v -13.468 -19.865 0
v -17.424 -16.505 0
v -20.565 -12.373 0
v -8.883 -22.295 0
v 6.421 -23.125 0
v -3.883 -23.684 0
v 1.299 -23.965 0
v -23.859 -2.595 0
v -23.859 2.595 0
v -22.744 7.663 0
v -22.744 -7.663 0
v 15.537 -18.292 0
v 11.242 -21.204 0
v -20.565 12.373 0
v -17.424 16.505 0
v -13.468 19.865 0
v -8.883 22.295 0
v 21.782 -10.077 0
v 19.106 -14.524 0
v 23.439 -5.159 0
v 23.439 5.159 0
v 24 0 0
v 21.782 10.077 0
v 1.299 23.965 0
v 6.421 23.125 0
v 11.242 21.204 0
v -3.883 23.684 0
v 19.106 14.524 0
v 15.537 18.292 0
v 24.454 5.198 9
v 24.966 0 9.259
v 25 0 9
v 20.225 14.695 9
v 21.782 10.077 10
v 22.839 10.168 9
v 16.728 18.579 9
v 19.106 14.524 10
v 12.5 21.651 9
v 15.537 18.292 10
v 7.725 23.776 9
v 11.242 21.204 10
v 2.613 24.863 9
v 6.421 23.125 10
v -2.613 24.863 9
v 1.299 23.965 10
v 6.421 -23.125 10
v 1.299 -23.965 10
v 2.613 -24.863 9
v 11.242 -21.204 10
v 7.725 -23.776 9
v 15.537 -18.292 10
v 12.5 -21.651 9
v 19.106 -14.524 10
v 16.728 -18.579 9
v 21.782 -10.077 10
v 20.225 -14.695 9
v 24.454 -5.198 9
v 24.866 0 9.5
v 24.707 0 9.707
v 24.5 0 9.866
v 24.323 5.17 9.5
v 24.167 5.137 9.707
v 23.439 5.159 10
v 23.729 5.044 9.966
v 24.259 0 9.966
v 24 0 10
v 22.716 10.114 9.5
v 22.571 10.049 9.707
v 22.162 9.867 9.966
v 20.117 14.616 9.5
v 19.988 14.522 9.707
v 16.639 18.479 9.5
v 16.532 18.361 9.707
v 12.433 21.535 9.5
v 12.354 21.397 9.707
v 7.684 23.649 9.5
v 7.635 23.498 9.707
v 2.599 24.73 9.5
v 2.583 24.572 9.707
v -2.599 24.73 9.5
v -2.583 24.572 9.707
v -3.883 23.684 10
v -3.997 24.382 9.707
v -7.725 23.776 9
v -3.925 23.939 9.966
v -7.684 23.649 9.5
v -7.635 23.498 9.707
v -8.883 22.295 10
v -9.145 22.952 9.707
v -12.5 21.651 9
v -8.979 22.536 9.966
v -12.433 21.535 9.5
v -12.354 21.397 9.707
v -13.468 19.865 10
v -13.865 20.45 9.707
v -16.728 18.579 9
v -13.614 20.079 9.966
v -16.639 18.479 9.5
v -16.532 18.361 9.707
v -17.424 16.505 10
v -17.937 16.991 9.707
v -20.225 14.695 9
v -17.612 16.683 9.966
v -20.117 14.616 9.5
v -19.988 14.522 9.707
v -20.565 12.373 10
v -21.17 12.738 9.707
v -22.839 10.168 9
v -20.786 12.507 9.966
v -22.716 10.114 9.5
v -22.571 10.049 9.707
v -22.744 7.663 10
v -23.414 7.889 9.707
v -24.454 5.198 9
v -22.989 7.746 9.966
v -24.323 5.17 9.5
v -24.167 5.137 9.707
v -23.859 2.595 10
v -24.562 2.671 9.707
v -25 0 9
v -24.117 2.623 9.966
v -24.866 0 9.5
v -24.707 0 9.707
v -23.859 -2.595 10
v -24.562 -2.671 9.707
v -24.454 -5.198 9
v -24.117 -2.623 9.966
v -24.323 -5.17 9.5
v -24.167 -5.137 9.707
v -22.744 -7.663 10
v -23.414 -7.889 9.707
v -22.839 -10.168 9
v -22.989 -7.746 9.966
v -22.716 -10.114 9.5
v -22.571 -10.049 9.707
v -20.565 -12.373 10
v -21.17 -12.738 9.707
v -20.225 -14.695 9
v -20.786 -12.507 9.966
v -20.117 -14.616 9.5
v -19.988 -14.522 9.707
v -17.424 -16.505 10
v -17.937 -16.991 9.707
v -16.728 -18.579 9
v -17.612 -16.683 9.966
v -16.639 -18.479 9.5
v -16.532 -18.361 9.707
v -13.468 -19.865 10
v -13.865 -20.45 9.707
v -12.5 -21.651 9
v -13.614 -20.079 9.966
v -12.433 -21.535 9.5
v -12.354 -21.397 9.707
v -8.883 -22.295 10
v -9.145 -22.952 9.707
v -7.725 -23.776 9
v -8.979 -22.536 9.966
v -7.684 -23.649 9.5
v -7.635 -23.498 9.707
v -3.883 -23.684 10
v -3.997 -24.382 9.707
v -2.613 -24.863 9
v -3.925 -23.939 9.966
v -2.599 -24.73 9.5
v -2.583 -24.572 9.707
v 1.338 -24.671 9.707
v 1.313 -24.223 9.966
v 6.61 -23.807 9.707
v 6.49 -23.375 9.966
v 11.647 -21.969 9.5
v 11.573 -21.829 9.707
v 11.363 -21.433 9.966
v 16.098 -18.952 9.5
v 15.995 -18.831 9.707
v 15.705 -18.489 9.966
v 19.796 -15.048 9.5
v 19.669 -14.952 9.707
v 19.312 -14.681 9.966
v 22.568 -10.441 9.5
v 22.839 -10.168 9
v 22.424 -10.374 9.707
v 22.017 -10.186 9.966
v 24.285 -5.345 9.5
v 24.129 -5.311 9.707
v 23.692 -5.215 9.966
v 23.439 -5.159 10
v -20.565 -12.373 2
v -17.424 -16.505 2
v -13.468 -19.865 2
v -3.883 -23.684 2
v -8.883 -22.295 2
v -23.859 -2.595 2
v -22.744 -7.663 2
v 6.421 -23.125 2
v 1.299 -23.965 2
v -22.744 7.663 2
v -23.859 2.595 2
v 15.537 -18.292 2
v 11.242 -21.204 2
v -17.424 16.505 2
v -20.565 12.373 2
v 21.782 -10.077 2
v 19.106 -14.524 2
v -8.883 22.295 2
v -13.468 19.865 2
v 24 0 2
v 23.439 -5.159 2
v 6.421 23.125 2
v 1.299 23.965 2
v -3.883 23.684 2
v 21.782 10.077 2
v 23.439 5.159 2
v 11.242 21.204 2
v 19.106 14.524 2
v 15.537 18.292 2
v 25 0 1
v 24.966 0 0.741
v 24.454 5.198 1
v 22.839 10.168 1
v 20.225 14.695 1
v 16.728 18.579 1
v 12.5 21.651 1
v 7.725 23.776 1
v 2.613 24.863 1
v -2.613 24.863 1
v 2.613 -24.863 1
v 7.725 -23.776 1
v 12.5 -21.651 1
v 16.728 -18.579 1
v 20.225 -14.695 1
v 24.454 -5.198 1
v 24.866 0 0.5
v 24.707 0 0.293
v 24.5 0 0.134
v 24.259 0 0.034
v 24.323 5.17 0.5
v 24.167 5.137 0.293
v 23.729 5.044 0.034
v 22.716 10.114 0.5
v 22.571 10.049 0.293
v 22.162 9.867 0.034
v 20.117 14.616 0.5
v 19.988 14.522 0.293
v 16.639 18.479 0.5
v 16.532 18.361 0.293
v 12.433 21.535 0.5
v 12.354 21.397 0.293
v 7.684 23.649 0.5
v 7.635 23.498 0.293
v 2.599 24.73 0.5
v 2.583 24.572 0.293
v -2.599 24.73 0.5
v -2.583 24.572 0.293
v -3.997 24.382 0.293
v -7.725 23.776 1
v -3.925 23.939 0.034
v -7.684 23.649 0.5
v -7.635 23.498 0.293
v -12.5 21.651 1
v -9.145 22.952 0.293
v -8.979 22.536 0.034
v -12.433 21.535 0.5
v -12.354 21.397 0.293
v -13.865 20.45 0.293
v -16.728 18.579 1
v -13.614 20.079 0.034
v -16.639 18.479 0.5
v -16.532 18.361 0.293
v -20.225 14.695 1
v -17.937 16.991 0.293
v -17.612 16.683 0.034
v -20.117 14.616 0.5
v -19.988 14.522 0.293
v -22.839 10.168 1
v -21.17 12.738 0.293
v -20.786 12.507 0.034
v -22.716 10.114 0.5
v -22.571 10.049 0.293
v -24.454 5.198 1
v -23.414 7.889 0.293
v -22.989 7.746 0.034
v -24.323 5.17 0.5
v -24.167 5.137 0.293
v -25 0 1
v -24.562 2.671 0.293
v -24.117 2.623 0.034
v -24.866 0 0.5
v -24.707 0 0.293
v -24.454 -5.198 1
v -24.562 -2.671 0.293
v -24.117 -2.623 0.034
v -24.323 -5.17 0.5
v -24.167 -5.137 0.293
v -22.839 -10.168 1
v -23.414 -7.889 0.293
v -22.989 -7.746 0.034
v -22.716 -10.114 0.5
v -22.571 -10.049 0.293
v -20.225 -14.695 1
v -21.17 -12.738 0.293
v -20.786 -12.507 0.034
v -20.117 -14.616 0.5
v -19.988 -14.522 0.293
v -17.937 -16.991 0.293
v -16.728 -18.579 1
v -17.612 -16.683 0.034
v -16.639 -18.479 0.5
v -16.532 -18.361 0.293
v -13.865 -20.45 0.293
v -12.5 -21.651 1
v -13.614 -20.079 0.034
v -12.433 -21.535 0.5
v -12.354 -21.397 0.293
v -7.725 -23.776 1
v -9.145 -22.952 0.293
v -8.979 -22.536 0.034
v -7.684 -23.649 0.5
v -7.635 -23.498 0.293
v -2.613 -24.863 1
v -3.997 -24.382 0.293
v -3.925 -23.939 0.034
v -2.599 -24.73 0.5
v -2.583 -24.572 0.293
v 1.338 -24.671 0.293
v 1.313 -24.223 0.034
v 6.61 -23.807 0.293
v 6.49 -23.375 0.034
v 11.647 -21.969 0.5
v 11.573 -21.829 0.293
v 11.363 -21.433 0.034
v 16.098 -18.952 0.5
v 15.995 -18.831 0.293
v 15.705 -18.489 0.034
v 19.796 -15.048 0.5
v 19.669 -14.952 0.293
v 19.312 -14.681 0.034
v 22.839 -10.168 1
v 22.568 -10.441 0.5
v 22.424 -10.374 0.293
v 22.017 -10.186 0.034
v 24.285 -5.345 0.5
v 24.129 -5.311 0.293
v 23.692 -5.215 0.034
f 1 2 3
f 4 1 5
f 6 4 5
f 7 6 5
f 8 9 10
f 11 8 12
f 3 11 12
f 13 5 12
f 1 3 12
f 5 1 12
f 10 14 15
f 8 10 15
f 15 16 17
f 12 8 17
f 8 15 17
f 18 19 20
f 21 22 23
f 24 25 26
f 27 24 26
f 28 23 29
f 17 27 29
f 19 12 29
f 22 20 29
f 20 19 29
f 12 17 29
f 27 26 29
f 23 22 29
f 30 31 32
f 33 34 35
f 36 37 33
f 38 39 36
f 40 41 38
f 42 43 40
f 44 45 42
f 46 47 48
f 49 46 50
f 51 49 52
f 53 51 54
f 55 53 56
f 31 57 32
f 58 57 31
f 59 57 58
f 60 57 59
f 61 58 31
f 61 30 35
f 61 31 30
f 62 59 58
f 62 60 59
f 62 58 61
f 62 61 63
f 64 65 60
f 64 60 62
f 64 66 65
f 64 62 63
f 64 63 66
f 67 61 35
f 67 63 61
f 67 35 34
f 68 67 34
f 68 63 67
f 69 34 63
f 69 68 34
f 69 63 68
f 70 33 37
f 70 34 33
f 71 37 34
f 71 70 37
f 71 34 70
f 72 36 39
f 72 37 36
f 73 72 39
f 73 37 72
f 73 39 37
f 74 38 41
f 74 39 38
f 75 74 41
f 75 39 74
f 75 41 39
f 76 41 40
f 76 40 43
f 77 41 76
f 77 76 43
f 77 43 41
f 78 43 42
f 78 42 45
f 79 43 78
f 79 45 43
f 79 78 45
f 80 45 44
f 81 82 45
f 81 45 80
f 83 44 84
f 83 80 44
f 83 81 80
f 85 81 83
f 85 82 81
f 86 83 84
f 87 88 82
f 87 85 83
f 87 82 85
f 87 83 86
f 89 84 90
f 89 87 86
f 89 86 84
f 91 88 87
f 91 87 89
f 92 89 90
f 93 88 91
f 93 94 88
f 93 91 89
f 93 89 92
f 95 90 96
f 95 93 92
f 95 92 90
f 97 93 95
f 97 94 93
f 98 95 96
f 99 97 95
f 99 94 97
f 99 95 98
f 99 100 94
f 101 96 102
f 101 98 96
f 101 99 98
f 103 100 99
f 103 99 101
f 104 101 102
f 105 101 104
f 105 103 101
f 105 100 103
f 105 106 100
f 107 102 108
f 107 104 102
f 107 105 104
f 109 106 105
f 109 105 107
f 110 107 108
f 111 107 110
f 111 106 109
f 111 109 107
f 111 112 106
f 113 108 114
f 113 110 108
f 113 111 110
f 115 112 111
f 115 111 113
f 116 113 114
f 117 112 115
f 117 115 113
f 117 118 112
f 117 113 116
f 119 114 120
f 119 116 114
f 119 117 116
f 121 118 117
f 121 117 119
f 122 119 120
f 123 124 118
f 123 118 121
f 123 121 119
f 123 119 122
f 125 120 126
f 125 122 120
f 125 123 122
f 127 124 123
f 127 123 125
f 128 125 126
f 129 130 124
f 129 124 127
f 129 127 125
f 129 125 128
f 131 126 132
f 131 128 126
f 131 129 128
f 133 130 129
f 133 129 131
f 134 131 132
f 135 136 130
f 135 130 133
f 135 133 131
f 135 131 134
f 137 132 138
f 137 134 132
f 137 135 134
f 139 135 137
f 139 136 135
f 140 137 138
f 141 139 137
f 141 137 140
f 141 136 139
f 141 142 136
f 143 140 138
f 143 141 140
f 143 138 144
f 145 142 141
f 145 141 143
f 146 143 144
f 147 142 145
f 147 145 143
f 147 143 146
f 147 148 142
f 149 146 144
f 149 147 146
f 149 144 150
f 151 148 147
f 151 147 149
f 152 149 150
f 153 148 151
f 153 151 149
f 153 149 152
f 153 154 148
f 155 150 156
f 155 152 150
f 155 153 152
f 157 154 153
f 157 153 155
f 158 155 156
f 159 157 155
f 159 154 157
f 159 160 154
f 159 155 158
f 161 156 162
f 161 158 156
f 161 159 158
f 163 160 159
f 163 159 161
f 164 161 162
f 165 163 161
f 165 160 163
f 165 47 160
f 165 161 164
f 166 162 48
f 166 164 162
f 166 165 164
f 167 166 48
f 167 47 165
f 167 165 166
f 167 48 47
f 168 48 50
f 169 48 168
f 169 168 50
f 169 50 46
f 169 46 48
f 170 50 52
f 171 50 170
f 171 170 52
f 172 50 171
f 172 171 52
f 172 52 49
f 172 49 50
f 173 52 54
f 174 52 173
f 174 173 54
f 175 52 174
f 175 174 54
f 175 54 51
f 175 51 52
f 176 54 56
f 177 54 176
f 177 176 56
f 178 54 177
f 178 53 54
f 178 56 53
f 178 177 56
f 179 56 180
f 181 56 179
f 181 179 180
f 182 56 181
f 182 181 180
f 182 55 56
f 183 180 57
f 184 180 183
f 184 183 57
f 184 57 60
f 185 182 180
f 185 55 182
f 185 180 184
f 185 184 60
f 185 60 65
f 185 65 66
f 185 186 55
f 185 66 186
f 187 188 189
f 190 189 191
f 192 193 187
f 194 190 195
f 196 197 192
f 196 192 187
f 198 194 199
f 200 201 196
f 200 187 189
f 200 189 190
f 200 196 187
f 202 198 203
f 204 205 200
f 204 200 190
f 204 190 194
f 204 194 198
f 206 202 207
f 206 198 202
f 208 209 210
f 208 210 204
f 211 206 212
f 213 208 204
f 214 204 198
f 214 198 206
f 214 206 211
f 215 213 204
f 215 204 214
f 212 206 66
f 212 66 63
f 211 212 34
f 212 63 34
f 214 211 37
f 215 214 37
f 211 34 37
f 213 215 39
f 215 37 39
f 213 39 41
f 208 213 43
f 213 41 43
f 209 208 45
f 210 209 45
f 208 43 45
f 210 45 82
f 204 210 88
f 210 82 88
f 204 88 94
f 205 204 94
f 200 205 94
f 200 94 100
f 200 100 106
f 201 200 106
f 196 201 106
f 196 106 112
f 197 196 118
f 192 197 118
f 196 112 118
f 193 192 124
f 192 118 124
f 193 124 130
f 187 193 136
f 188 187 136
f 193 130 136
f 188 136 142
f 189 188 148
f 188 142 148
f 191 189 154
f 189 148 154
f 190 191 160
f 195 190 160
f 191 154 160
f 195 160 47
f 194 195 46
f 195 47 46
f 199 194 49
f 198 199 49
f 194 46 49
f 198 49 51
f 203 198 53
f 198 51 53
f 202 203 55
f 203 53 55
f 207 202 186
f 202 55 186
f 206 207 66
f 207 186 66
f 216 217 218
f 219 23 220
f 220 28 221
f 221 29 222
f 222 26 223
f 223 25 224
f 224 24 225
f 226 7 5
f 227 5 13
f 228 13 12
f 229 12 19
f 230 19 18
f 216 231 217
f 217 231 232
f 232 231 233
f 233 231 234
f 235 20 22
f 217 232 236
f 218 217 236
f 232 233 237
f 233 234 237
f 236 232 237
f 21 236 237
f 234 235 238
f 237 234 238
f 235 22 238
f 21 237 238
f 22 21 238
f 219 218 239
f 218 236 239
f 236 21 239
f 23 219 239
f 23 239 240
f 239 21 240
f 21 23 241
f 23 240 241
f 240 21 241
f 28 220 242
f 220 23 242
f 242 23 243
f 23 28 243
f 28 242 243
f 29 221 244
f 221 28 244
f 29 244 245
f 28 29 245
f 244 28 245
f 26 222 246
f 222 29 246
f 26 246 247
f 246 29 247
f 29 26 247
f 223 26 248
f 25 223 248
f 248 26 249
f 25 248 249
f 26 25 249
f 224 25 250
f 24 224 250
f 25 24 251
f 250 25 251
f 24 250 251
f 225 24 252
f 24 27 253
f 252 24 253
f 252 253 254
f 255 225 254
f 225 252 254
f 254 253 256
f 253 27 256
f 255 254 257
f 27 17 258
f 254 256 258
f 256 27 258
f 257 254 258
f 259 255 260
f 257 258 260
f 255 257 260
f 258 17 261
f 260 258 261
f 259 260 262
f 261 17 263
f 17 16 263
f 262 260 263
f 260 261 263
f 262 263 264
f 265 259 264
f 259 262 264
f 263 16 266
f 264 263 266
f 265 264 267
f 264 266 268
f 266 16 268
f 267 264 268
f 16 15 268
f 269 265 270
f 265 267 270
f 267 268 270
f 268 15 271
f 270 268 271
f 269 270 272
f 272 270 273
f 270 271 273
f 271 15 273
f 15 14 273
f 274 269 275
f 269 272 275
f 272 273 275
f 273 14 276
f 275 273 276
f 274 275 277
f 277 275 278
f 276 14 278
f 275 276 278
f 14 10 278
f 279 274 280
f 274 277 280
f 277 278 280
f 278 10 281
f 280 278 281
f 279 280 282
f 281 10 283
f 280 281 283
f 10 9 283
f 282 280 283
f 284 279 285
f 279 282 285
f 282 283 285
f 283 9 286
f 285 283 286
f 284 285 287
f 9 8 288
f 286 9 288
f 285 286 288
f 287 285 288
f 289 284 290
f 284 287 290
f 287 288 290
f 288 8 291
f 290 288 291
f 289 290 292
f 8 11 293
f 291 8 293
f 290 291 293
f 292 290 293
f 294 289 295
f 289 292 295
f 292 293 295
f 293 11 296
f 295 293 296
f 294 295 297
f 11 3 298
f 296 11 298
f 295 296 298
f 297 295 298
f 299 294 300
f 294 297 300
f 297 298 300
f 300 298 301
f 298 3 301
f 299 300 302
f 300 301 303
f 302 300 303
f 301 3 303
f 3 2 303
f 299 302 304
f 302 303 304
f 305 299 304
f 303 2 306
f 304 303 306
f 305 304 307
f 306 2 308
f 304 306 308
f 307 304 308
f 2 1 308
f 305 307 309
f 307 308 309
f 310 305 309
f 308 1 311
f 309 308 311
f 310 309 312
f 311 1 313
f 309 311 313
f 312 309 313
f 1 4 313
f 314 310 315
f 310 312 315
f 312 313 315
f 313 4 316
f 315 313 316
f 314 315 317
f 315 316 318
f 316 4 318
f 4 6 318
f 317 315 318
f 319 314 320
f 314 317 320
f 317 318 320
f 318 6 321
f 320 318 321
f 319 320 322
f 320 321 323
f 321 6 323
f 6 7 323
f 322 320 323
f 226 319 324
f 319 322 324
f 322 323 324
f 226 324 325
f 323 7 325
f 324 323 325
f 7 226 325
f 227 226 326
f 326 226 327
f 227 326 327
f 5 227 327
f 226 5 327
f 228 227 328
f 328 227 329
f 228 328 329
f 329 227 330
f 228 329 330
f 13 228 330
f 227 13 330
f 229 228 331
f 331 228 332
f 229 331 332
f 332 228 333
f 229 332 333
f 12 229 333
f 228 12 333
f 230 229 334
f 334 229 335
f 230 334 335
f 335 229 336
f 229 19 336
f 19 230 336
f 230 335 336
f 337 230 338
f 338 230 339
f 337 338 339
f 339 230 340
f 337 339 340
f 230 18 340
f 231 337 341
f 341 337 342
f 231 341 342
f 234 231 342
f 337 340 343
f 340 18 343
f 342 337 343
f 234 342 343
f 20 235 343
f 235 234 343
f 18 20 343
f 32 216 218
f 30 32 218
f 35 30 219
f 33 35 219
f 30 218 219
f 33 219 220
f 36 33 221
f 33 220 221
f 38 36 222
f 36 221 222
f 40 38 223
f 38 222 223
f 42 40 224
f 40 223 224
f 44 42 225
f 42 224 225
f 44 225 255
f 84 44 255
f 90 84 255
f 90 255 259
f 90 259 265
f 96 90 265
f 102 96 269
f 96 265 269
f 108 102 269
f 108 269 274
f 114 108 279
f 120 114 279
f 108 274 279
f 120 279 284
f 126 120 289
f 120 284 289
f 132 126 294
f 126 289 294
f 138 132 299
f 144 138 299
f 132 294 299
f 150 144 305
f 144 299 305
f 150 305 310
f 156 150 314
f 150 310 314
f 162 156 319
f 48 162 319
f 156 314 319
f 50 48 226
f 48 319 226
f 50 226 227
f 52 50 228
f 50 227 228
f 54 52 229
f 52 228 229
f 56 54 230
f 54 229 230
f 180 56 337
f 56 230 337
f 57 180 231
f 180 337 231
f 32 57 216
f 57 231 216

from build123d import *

# Parameters (mm, degrees)
F0_R     = 25
F1_DEPTH = 10
F2_R     = 24
F3_DEPTH = 8
F4_R     = 0.99999
F5_R     = 1


# Not quite as in the source:
# - a fillet or chamfer is up to 0.001 mm smaller than in the source, because OpenCascade refuses the exact size


with BuildPart() as f1:
    # F0 (on Top) → F1 (new body)
    with BuildSketch(Plane.XY):
        Circle(F0_R)
    extrude(amount=F1_DEPTH)

    # F2 (on face) → F3 (cut)
    with BuildSketch(Plane.XY.offset(10)):
        Circle(F2_R)
    extrude(amount=-F3_DEPTH, mode=Mode.SUBTRACT)

    # F4 (radius 1 in the source; OpenCascade refuses exactly that, so slightly less here)
    f4_edges = [f1.edges().sort_by_distance(p)[0] for p in [
        (-25, 0, 10),
    ]]
    fillet(f4_edges, radius=F4_R)

    # F5
    f5_edges = [f1.edges().sort_by_distance(p)[0] for p in [
        (-25, 0, 0),
    ]]
    fillet(f5_edges, radius=F5_R)


solid = f1.part
